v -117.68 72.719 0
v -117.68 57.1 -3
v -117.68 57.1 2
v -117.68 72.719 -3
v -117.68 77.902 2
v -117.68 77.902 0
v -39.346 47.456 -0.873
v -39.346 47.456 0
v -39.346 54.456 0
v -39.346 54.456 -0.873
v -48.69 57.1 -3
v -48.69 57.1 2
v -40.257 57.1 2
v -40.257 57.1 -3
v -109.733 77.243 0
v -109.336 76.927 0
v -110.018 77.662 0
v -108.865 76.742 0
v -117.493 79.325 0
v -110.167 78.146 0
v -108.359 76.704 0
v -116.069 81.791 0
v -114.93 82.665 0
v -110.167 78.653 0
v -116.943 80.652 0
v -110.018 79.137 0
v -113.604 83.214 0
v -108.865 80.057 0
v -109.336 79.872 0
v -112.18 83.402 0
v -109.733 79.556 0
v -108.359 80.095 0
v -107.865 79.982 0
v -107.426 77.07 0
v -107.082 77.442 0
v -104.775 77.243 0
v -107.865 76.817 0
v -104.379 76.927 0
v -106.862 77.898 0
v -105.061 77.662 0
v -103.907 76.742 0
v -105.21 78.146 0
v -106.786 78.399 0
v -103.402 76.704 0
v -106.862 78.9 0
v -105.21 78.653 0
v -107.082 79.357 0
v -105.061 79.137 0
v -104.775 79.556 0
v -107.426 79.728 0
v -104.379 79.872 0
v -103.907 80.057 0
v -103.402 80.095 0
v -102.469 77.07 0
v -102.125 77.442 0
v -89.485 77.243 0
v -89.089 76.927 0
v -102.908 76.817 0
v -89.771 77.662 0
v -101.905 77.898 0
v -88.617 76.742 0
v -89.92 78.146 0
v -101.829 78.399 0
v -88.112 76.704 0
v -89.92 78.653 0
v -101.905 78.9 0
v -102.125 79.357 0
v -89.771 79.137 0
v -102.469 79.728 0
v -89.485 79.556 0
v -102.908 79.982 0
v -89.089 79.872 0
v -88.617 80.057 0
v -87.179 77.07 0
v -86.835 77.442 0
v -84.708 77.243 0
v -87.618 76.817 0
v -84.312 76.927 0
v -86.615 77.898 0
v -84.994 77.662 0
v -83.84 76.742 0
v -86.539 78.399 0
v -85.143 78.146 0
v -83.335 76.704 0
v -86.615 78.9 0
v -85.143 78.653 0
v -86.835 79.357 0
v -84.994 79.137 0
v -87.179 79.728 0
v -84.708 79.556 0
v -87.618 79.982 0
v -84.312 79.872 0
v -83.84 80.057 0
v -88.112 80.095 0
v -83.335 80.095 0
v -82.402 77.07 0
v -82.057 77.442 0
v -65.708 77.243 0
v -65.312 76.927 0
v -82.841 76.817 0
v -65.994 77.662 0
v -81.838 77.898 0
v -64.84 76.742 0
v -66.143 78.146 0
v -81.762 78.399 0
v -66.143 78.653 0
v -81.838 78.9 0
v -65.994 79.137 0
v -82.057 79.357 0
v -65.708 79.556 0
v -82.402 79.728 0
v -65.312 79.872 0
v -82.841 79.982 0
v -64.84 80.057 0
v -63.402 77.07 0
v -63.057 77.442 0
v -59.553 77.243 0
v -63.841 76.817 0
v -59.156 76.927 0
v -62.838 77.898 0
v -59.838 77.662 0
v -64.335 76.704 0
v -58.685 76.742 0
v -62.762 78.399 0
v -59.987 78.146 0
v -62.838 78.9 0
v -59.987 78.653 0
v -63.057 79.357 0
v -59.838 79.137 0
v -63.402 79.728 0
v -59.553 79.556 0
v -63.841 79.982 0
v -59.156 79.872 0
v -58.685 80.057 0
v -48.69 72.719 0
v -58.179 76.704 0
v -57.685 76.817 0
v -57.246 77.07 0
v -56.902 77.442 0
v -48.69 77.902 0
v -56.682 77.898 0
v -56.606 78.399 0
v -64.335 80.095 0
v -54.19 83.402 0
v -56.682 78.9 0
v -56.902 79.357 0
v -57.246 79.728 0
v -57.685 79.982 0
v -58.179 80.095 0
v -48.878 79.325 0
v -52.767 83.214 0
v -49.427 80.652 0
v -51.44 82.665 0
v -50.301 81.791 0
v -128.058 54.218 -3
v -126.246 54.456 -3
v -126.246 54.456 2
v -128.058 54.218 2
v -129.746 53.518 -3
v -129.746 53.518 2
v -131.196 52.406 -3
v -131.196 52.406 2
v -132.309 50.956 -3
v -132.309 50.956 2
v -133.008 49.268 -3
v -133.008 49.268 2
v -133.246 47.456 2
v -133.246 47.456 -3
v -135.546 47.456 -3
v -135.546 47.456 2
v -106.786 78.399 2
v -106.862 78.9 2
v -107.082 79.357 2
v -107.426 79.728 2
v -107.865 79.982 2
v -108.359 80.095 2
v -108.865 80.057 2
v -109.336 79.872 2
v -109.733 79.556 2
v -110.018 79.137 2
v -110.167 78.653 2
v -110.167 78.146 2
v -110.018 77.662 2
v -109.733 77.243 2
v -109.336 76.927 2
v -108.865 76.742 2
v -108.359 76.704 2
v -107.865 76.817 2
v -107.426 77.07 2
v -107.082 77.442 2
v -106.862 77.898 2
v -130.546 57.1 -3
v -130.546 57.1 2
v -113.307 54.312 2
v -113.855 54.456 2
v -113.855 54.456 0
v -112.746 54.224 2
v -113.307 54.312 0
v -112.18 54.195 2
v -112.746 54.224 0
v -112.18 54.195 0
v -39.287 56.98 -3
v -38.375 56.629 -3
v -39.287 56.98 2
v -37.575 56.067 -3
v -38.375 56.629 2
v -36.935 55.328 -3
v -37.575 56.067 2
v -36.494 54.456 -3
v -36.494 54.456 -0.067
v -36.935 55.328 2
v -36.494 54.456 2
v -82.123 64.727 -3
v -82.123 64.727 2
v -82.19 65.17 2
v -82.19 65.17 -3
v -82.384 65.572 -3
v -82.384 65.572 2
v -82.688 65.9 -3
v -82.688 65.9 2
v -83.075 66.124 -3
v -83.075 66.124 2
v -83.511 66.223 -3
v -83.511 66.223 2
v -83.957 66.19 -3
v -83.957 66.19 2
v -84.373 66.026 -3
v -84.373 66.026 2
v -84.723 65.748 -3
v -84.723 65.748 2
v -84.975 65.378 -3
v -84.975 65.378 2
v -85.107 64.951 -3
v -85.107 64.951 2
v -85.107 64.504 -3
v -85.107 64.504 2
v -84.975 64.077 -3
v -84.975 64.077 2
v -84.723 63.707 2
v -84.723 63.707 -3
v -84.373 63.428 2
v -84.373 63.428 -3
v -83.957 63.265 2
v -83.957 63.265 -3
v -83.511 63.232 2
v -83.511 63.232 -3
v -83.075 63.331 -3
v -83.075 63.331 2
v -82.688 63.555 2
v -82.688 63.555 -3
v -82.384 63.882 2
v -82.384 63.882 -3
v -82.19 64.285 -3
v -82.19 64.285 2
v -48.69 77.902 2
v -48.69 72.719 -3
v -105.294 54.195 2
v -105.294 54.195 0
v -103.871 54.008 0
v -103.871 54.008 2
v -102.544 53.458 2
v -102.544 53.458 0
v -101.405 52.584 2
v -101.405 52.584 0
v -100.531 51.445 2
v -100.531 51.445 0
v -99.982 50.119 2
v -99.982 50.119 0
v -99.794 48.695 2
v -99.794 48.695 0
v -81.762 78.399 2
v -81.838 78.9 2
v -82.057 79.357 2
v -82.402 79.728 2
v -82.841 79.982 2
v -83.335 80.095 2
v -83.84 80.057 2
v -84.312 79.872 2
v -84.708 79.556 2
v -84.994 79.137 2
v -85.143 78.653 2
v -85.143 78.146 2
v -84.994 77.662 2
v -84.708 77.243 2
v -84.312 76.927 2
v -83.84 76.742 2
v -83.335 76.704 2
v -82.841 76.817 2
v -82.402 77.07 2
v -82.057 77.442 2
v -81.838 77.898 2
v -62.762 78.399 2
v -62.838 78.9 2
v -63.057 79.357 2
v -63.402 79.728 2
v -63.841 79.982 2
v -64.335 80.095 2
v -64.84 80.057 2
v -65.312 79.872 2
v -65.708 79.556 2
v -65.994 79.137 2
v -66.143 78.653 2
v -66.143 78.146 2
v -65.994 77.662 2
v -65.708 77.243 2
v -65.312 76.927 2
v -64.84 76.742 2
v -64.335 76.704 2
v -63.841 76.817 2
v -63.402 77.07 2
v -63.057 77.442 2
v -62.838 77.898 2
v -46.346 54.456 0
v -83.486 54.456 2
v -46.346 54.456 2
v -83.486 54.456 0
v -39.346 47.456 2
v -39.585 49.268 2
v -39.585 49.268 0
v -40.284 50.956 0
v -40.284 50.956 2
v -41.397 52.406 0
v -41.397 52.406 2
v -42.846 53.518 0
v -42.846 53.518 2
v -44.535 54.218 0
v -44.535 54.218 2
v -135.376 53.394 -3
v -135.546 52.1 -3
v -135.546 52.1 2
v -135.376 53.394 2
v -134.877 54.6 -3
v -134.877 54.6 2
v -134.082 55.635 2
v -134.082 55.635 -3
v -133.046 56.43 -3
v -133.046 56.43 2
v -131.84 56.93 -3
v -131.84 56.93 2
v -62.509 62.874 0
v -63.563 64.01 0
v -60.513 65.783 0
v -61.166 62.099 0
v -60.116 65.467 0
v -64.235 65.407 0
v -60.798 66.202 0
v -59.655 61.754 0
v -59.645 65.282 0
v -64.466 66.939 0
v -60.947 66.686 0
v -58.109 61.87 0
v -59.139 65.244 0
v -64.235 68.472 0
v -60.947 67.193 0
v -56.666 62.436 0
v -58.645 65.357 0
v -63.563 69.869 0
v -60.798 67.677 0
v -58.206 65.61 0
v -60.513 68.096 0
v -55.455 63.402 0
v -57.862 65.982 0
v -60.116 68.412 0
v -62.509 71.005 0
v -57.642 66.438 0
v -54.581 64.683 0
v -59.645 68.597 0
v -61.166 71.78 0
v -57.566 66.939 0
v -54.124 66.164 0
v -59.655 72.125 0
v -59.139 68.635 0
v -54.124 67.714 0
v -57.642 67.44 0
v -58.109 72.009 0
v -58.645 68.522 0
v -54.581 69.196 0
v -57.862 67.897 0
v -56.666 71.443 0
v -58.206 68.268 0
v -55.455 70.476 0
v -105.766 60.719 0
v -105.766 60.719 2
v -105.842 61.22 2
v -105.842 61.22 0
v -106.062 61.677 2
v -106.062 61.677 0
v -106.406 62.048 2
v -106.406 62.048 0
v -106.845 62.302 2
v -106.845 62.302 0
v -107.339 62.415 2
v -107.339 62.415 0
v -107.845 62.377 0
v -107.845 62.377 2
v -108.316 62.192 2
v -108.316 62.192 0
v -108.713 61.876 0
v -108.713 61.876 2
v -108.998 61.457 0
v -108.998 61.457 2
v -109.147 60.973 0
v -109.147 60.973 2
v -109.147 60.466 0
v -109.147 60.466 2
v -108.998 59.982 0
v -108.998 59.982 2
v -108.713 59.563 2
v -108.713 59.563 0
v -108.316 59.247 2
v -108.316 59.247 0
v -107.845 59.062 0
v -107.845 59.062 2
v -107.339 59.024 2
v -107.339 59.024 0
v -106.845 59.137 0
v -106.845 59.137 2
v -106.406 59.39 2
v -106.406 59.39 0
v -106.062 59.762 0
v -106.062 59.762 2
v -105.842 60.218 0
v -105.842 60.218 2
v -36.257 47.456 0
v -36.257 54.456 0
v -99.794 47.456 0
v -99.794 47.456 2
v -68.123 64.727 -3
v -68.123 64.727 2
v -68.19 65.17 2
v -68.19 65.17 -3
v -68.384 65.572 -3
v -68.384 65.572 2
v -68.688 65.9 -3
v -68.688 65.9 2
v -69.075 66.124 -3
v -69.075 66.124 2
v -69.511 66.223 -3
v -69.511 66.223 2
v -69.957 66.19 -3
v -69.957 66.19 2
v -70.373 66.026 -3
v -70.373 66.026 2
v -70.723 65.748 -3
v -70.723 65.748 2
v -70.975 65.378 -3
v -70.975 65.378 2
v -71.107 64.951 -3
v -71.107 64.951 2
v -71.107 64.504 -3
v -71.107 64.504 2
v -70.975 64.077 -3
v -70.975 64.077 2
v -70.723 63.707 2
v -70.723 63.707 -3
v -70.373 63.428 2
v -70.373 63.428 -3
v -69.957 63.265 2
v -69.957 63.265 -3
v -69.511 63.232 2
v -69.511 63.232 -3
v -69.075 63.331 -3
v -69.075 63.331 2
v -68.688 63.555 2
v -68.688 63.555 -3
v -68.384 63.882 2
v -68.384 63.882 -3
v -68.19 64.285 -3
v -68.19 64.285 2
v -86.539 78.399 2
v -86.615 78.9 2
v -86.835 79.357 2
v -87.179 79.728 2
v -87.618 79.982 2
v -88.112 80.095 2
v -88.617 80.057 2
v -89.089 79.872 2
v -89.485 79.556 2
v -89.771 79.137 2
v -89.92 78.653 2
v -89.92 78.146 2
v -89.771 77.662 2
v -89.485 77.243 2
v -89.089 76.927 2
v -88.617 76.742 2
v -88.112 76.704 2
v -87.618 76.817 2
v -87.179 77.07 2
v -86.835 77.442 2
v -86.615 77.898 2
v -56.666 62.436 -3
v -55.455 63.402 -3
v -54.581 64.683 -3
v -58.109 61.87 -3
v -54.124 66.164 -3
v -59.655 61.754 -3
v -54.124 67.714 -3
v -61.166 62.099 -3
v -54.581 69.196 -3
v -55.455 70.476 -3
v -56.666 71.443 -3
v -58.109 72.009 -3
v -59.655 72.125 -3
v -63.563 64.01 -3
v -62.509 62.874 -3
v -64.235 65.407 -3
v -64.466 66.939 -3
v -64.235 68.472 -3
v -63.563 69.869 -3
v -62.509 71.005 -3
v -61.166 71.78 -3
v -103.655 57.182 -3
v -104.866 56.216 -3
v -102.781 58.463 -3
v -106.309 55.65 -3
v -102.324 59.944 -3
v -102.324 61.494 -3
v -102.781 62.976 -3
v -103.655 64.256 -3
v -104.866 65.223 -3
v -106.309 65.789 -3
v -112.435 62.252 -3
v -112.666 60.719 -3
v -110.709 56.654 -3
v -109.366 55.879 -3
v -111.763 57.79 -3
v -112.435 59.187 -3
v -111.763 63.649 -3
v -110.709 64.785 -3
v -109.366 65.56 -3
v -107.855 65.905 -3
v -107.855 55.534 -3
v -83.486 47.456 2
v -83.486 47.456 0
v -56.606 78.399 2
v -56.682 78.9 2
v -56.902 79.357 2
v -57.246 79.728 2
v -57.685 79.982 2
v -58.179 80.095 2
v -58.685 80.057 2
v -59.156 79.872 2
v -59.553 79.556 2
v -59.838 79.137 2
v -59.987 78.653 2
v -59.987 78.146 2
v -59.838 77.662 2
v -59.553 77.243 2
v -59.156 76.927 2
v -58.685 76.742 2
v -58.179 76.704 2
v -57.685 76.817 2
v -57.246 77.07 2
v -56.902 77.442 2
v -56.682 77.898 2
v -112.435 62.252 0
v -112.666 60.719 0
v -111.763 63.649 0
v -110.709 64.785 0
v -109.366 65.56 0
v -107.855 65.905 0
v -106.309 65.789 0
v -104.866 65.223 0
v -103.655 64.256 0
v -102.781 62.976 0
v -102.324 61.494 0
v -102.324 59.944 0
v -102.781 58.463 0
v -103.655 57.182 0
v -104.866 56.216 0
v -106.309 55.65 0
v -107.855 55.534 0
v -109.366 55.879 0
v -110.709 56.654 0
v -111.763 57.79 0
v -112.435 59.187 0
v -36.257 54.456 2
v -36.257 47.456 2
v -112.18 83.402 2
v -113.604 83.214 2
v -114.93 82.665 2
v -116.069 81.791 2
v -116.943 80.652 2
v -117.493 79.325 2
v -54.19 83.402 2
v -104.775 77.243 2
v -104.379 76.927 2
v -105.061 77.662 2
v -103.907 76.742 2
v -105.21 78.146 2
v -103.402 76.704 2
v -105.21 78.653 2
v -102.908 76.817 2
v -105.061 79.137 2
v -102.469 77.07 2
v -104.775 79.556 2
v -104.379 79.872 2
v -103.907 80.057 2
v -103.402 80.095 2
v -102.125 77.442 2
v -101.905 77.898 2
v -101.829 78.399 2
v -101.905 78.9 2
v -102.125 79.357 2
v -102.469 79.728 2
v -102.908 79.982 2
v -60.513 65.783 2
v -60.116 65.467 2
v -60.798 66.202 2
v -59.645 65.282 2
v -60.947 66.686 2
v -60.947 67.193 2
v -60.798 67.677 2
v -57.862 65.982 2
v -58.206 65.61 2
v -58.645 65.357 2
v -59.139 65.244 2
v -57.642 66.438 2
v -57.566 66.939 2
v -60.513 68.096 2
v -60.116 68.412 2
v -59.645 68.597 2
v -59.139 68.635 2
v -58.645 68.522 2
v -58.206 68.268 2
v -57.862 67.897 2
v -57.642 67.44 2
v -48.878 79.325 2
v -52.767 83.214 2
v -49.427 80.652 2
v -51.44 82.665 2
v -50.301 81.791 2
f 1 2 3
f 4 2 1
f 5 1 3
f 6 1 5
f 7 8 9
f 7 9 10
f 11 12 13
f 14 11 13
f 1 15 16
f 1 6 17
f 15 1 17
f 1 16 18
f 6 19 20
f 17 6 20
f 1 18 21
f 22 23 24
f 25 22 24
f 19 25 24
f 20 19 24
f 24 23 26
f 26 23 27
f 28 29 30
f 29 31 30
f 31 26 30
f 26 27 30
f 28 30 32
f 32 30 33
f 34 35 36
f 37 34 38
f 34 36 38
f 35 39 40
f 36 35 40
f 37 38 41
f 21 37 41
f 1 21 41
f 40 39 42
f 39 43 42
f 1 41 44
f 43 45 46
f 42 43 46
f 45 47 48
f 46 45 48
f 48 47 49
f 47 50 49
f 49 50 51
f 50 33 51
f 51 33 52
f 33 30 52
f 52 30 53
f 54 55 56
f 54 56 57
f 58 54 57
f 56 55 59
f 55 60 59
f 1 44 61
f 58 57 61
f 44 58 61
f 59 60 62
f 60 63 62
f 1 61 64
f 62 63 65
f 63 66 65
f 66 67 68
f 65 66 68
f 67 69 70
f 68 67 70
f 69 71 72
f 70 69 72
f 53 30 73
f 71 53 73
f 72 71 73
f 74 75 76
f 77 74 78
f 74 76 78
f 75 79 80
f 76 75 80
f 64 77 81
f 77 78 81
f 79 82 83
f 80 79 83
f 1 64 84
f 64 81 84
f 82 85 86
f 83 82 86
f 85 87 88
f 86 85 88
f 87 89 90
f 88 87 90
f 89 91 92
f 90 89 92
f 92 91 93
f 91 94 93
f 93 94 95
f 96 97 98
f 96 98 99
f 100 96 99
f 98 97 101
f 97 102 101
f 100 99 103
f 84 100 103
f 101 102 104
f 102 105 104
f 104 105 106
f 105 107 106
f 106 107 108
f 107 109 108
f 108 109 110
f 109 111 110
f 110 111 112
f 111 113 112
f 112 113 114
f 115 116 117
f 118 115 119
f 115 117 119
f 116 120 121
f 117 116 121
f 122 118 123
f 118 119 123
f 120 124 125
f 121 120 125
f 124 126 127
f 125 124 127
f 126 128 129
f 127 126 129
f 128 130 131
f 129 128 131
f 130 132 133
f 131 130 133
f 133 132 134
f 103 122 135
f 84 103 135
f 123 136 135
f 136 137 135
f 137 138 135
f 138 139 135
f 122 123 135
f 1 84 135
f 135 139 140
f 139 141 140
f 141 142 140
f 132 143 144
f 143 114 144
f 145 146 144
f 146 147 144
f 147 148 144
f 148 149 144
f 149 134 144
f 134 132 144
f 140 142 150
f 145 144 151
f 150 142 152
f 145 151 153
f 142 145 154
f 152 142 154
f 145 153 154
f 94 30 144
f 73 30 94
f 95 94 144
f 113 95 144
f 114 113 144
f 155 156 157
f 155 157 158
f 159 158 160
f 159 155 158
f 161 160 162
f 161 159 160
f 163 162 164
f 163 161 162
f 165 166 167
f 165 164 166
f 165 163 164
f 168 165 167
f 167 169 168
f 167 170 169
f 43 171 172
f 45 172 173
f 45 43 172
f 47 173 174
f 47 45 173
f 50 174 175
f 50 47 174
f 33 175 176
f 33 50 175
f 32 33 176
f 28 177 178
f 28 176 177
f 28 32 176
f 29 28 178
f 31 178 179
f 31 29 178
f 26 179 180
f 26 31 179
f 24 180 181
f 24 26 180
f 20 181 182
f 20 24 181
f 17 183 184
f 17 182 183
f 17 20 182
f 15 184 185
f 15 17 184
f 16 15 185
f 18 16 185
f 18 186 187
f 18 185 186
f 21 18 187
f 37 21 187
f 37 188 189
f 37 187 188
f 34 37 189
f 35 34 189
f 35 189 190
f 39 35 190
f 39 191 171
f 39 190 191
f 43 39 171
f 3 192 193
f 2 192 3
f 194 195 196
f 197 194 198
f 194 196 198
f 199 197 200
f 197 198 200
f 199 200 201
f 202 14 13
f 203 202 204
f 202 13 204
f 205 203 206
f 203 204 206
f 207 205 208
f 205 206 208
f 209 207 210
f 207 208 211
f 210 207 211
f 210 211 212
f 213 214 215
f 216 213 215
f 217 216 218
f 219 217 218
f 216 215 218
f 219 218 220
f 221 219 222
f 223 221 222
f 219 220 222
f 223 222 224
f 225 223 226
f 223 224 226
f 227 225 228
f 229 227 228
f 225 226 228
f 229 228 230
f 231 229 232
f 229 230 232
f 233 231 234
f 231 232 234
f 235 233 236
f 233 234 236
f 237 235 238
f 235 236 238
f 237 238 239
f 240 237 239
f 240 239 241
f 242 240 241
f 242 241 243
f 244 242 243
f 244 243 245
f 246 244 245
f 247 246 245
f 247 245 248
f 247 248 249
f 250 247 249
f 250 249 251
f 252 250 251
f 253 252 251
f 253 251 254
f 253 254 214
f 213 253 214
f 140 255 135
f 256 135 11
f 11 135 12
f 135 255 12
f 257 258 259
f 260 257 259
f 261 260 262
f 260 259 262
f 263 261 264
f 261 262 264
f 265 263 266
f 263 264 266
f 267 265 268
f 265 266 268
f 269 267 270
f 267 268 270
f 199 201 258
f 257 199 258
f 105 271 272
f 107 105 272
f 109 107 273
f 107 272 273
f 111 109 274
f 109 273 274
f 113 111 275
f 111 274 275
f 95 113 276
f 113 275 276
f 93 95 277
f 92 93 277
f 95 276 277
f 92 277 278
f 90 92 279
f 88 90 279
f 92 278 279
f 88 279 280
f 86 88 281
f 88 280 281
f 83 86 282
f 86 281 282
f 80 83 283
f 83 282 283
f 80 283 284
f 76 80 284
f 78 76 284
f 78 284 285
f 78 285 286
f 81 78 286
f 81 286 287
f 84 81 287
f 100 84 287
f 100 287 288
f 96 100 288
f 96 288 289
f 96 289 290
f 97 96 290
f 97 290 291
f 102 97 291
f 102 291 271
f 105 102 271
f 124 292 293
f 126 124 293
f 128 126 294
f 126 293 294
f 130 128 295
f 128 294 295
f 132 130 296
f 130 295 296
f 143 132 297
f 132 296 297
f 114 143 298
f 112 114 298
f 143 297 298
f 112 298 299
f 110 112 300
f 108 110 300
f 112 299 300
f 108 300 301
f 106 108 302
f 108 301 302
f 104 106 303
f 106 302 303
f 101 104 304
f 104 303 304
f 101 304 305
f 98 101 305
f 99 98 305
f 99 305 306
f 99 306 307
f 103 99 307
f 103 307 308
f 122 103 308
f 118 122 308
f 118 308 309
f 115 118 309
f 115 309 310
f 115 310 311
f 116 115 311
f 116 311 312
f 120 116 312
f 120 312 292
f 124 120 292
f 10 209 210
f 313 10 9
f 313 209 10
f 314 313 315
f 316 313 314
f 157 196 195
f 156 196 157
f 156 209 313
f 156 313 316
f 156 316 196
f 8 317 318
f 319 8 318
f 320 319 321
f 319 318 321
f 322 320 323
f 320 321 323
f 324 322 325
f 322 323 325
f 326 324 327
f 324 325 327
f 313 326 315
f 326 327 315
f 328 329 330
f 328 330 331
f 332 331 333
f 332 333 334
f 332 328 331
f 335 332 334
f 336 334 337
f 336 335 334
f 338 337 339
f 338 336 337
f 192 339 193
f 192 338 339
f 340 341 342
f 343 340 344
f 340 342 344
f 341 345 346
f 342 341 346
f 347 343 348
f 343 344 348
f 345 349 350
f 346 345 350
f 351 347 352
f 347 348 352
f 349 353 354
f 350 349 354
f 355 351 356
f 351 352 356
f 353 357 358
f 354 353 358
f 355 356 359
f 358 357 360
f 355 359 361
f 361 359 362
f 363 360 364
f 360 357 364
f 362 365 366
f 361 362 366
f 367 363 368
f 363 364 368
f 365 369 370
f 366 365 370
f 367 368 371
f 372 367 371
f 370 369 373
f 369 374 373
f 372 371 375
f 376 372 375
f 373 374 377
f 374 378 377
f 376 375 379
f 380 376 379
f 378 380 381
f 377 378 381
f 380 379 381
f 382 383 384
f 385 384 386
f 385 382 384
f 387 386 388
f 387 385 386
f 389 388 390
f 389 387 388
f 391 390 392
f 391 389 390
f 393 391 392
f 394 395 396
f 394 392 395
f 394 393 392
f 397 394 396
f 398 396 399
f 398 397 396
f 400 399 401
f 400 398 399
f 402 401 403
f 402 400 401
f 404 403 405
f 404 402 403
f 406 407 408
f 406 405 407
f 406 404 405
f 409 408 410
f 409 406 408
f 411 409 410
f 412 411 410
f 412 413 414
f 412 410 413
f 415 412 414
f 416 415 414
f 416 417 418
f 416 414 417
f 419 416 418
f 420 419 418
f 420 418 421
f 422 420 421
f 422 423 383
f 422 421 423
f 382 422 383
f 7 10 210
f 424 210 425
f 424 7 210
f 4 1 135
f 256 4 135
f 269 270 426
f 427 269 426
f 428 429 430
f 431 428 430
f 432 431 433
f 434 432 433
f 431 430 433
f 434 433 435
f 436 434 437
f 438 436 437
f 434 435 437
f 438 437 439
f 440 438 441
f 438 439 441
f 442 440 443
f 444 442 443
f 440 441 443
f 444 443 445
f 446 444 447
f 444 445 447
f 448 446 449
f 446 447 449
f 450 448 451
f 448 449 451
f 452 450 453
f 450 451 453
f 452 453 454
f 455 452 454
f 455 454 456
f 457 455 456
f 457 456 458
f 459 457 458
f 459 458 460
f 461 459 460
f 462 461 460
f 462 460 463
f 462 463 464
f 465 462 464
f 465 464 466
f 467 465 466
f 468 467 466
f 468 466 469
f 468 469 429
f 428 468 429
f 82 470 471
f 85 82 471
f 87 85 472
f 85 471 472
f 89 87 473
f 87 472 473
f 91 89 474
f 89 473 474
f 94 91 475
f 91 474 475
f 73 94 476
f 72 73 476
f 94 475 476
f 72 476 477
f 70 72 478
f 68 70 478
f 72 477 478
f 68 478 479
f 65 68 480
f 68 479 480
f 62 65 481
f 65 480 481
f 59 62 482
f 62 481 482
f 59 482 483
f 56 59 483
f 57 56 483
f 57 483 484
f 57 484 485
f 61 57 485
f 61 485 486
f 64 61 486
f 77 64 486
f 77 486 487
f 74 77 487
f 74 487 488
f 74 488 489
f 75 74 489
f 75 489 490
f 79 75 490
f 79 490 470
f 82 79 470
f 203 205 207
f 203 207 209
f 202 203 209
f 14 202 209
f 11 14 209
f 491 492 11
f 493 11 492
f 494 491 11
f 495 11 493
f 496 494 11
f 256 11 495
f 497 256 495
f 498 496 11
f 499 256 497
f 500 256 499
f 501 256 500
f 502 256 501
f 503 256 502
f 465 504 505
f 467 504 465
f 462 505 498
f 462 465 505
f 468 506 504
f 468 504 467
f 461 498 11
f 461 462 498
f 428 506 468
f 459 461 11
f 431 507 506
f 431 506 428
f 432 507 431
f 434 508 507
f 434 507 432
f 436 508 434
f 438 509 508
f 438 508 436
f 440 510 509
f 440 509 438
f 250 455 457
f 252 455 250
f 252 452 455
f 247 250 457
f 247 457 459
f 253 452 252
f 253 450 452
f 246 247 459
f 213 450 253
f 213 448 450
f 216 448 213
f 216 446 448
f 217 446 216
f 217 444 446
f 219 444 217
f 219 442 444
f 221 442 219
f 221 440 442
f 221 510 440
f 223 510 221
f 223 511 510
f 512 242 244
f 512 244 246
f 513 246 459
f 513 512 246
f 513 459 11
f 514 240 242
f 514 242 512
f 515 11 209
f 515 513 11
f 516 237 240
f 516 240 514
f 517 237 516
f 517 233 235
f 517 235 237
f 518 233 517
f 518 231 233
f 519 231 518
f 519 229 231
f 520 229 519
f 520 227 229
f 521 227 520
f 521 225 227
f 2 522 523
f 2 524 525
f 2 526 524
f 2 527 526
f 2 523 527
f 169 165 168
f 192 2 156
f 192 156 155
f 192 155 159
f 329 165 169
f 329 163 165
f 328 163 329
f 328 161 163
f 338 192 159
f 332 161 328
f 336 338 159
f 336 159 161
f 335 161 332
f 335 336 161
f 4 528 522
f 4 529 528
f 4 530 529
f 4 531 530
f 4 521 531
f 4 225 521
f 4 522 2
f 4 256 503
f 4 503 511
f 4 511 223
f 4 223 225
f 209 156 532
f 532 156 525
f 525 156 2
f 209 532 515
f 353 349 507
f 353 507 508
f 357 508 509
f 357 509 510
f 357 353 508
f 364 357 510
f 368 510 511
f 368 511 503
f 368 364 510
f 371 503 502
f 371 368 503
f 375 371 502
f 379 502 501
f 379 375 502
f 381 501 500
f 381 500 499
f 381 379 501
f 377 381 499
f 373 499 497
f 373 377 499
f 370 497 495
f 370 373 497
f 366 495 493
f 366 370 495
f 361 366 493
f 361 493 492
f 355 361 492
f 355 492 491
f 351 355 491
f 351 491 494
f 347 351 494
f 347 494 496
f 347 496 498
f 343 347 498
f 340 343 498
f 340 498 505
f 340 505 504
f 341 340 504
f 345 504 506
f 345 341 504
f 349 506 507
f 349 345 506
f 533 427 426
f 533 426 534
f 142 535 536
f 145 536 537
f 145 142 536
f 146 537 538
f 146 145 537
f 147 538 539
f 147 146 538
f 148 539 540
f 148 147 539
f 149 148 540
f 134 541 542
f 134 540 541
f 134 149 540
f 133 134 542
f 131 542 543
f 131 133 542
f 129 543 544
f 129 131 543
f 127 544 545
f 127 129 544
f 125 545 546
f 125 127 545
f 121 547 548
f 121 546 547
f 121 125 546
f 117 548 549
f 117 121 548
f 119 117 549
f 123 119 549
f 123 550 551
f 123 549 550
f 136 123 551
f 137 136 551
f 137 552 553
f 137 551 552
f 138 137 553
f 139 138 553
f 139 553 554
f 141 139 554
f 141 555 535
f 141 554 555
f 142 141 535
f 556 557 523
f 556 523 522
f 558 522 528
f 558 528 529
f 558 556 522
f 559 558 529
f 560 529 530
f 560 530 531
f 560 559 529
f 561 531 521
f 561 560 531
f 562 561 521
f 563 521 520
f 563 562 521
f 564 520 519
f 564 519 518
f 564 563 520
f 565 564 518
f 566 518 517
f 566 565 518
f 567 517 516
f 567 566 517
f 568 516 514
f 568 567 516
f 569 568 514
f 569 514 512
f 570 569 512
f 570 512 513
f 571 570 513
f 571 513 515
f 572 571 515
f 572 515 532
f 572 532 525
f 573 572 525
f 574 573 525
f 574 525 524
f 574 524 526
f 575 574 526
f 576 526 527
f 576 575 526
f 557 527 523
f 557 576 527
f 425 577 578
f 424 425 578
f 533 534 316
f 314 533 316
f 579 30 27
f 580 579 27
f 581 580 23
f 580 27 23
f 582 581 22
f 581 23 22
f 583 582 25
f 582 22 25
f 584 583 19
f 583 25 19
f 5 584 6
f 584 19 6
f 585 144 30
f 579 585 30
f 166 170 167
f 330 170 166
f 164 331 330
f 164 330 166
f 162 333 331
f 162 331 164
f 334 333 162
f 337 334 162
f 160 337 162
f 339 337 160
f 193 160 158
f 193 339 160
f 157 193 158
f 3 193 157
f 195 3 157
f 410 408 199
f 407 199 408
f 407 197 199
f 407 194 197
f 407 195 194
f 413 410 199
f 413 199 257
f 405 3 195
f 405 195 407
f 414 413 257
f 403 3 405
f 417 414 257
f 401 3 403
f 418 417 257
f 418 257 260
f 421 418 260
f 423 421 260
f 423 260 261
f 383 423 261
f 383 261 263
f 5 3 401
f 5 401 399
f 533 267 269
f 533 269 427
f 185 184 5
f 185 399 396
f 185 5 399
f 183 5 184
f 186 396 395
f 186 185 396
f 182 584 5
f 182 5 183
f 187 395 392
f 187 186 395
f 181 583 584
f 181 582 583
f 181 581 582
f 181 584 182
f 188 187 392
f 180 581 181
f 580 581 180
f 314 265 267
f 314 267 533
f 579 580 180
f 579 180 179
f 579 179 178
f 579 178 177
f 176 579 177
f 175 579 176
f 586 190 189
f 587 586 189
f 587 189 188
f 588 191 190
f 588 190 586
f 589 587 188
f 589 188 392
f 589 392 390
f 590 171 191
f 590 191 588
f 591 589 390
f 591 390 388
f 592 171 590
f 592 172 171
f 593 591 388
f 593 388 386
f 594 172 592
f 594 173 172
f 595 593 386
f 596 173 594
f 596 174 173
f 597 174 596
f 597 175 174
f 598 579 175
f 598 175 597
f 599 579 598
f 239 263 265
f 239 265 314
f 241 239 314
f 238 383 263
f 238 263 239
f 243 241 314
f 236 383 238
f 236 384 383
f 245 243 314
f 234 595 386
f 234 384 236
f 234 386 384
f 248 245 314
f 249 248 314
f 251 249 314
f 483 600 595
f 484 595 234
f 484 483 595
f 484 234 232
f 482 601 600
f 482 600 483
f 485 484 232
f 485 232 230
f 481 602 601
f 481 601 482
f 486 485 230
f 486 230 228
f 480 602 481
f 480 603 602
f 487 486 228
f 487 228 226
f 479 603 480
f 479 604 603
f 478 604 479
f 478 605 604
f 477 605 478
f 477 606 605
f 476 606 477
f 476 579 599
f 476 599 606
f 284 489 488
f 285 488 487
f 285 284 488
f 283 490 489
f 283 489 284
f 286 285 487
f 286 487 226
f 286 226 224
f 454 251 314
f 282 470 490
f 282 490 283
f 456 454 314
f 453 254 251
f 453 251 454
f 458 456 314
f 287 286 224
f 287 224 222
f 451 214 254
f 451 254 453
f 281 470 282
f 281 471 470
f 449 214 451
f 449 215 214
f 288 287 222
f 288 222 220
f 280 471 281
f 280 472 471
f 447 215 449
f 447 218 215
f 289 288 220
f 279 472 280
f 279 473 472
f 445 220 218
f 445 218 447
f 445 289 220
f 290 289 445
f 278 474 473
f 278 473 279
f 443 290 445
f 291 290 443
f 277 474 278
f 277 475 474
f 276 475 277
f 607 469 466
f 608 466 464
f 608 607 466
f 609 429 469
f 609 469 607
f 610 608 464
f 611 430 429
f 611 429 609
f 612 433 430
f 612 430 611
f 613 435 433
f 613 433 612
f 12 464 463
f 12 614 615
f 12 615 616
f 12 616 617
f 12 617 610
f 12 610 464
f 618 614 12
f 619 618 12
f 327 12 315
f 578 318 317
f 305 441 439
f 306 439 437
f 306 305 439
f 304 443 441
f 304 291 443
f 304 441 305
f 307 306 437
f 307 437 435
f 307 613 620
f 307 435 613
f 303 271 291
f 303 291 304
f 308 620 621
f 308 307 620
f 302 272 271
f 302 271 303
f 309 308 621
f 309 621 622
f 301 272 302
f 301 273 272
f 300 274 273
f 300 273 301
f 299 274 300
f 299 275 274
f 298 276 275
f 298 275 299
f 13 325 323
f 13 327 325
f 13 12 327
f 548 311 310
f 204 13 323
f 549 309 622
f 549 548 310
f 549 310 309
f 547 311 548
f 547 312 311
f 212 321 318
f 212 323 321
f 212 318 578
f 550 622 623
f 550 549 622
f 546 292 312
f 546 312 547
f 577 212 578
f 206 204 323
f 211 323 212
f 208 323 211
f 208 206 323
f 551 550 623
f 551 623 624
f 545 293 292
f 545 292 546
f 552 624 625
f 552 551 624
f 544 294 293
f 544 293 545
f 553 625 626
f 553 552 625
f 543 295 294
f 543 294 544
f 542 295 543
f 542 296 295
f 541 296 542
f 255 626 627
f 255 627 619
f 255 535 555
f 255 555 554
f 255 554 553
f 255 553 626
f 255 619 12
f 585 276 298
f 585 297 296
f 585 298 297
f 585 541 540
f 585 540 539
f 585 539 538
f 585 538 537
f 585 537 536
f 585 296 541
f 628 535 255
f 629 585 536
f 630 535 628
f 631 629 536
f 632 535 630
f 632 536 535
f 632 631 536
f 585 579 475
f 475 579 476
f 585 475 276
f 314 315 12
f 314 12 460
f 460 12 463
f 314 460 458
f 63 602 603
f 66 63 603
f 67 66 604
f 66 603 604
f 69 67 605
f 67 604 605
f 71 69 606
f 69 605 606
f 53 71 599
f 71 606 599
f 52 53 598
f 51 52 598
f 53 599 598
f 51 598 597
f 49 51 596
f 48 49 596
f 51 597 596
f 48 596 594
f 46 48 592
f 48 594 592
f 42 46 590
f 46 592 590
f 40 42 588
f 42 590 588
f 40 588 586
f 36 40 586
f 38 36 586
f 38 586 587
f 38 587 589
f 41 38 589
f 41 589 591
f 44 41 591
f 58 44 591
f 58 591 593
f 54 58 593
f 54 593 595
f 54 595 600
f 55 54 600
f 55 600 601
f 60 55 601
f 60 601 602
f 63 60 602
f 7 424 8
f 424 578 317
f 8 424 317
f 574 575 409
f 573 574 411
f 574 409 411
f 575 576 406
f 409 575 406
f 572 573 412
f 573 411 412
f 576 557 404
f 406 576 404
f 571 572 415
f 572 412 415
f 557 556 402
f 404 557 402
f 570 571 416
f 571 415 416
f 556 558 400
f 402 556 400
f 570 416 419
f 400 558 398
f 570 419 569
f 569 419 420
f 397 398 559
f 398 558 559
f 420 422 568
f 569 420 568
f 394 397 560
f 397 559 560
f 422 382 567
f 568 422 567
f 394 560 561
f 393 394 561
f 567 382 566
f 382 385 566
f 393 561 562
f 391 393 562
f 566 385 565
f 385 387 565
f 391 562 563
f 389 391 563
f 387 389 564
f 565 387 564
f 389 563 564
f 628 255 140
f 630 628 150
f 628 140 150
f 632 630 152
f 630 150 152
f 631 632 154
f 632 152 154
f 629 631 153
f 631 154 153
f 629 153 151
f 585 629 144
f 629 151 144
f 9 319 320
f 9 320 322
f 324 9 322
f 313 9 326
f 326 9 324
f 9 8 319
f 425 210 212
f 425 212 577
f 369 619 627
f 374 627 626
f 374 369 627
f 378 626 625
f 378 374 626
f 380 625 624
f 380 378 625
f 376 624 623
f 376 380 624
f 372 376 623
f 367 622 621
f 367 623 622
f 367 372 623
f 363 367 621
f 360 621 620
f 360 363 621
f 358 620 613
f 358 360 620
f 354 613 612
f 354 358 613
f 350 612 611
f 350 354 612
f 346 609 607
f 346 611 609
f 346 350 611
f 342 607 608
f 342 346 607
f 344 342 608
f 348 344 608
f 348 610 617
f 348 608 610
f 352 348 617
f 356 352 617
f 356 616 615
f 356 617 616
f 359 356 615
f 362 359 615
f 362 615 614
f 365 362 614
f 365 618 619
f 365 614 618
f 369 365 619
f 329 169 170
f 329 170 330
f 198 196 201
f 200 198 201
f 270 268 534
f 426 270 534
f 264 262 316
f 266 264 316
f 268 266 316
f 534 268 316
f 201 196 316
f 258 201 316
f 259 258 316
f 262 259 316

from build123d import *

# Parameters (mm, degrees)
ESQUISSE1_R             = 1.7
BOSS_EXTRU_1_DEPTH      = 3
BOSS_EXTRU_2_DEPTH      = 3
BOSS_EXTRU_2_DEPTH_BACK = 3
ESQUISSE2_R             = 5.2
ESQUISSE5_W             = 129.390100882
ESQUISSE5_H             = 120.053414285
ENL_V_MAT_EXTRU_2_DEPTH = 1
ESQUISSE6_R             = 1.5
ENL_V_MAT_EXTRU_3_DEPTH = 8
ESQUISSE7_W             = 14.610679854
ESQUISSE7_H             = 62.75
ENL_V_MAT_EXTRU_4_DEPTH = 8
BOSS_EXTRU_3_DEPTH      = 7
BOSS_EXTRU_4_DEPTH      = 7
ESQUISSE11_W            = 149.051338644
ESQUISSE11_H            = 13.366564364
ENL_V_MAT_EXTRU_5_DEPTH = 80
ESQUISSE13_R            = 1.7
ENL_V_MAT_EXTRU_6_DEPTH = 15


with BuildPart() as part:
    # Esquisse1 → Boss.-Extru.1 (new body)
    with BuildSketch(Plane.XY):
        with BuildLine():
            Line((-117.680084405, 66.939310237), (-117.680084405, 59.695120061))
            ThreePointArc((-117.680084405, 59.695120061), (-116.069171702, 55.806032765), (-112.180084405, 54.195120061))
            Line((-112.180084405, 54.195120061), (-105.294175096, 54.195120061))
            ThreePointArc((-105.294175096, 54.195120061), (-101.4050878, 52.584207358), (-99.794175096, 48.695120061))
            Line((-99.794175096, 48.695120061), (-99.794175096, 35.930823665))
            ThreePointArc((-99.794175096, 35.930823665), (-101.4050878, 32.041736368), (-105.294175096, 30.430823665))
            Line((-105.294175096, 30.430823665), (-112.180084405, 30.430823665))
            ThreePointArc((-112.180084405, 30.430823665), (-116.069171702, 28.819910961), (-117.680084405, 24.930823665))
            Line((-117.680084405, 24.930823665), (-117.680084405, 23.910007682))
            ThreePointArc((-117.680084405, 23.910007682), (-116.069171702, 20.020920385), (-112.180084405, 18.410007682))
            Line((-112.180084405, 18.410007682), (-105.294175096, 18.410007682))
            ThreePointArc((-105.294175096, 18.410007682), (-101.4050878, 16.799094979), (-99.794175096, 12.910007682))
            Line((-99.794175096, 12.910007682), (-99.794175096, 1.692208933))
            ThreePointArc((-99.794175096, 1.692208933), (-101.4050878, -2.196878364), (-105.294175096, -3.807791067))
            Line((-105.294175096, -3.807791067), (-113.390601299, -3.807791067))
            ThreePointArc((-113.390601299, -3.807791067), (-117.279688595, -5.418703771), (-118.890601299, -9.307791067))
            Line((-118.890601299, -9.307791067), (-118.890601299, -18.42196685))
            ThreePointArc((-118.890601299, -18.42196685), (-117.279688595, -22.311054147), (-113.390601299, -23.92196685))
            Line((-113.390601299, -23.92196685), (-52.866544484, -23.92196685))
            ThreePointArc((-52.866544484, -23.92196685), (-48.977457187, -22.311054147), (-47.366544484, -18.42196685))
            Line((-47.366544484, -18.42196685), (-47.366544484, -9.307791067))
            ThreePointArc((-47.366544484, -9.307791067), (-48.977457187, -5.418703771), (-52.866544484, -3.807791067))
            Line((-52.866544484, -3.807791067), (-77.986378892, -3.807791067))
            ThreePointArc((-77.986378892, -3.807791067), (-81.875466189, -2.196878364), (-83.486378892, 1.692208933))
            Line((-83.486378892, 1.692208933), (-83.486378892, 12.910007682))
            ThreePointArc((-83.486378892, 12.910007682), (-81.875466189, 16.799094979), (-77.986378892, 18.410007682))
            Line((-77.986378892, 18.410007682), (-69.856378892, 18.410007682))
            ThreePointArc((-69.856378892, 18.410007682), (-65.967291596, 20.020920385), (-64.356378892, 23.910007682))
            Line((-64.356378892, 23.910007682), (-64.356378892, 24.930823665))
            ThreePointArc((-64.356378892, 24.930823665), (-65.967291596, 28.819910961), (-69.856378892, 30.430823665))
            Line((-69.856378892, 30.430823665), (-77.986378892, 30.430823665))
            ThreePointArc((-77.986378892, 30.430823665), (-81.875466189, 32.041736368), (-83.486378892, 35.930823665))
            Line((-83.486378892, 35.930823665), (-83.486378892, 55.219310237))
            ThreePointArc((-83.486378892, 55.219310237), (-81.875466189, 59.108397534), (-77.986378892, 60.719310237))
            Line((-77.986378892, 60.719310237), (-54.190366806, 60.719310237))
            ThreePointArc((-54.190366806, 60.719310237), (-50.30127951, 62.330222941), (-48.690366806, 66.219310237))
            Line((-48.690366806, 66.219310237), (-48.690366806, 67.219310237))
            Line((-48.690366806, 67.219310237), (-48.690366806, 77.901748252))
            ThreePointArc((-48.690366806, 77.901748252), (-50.30127951, 81.790835548), (-54.190366806, 83.401748252))
            Line((-54.190366806, 83.401748252), (-112.180084405, 83.401748252))
            ThreePointArc((-112.180084405, 83.401748252), (-116.069171702, 81.790835548), (-117.680084405, 77.901748252))
            Line((-117.680084405, 77.901748252), (-117.680084405, 67.219310237))
            Line((-117.680084405, 67.219310237), (-117.680084405, 66.939310237))
        make_face()
        with Locations((-59.266378892, -15.663707737)):
            Circle(ESQUISSE1_R, mode=Mode.SUBTRACT)
        with Locations((-59.266378892, 66.939310237)):
            Circle(ESQUISSE1_R, mode=Mode.SUBTRACT)
        with Locations((-91.856378892, 36.719310237)):
            Circle(ESQUISSE1_R, mode=Mode.SUBTRACT)
        with Locations((-107.466378892, -14.520689763)):
            Circle(ESQUISSE1_R, mode=Mode.SUBTRACT)
        with Locations((-107.466378892, 60.719310237)):
            Circle(ESQUISSE1_R, mode=Mode.SUBTRACT)
        with Locations((-58.306378892, 78.399310237)):
            Circle(ESQUISSE1_R, mode=Mode.SUBTRACT)
        with Locations((-108.486378892, 78.399310237)):
            Circle(ESQUISSE1_R, mode=Mode.SUBTRACT)
        with BuildLine():
            Line((-111.390601299, 21.460065469), (-70.086378892, 21.460065469))
            ThreePointArc((-70.086378892, 21.460065469), (-68.67216533, 22.045851906), (-68.086378892, 23.460065469))
            Line((-68.086378892, 23.460065469), (-68.086378892, 24.842520386))
            ThreePointArc((-68.086378892, 24.842520386), (-68.67216533, 26.256733949), (-70.086378892, 26.842520386))
            Line((-70.086378892, 26.842520386), (-111.390601299, 26.842520386))
            ThreePointArc((-111.390601299, 26.842520386), (-112.804814861, 26.256733949), (-113.390601299, 24.842520386))
            Line((-113.390601299, 24.842520386), (-113.390601299, 23.460065469))
            ThreePointArc((-113.390601299, 23.460065469), (-112.804814861, 22.045851906), (-111.390601299, 21.460065469))
        make_face(mode=Mode.SUBTRACT)
    extrude(amount=BOSS_EXTRU_1_DEPTH)

    # Esquisse2 → Boss.-Extru.2 (add, two sides: drawn at the far end of the back side and taken through both)
    with BuildSketch(Plane(origin=(0, 0, 0), x_dir=(-1, 0, 0), z_dir=(0, 0, -1)).offset(-BOSS_EXTRU_2_DEPTH_BACK)):
        with BuildLine():
            Line((118.890601299, -9.969506719), (130.584615963, -9.880075131))
            ThreePointArc((130.584615963, -9.880075131), (134.095405897, -8.402210456), (135.546378892, -4.880221341))
            Line((135.546378892, -4.880221341), (135.546378892, 5.415623015))
            ThreePointArc((135.546378892, 5.415623015), (136.425058549, 7.536943358), (138.546378892, 8.415623015))
            Line((138.546378892, 8.415623015), (145.752654566, 8.415623015))
            ThreePointArc((145.752654566, 8.415623015), (147.87397491, 9.294302671), (148.752654566, 11.415623015))
            Line((148.752654566, 11.415623015), (148.752654566, 38.179170847))
            ThreePointArc((148.752654566, 38.179170847), (147.87397491, 40.300491191), (145.752654566, 41.179170847))
            Line((145.752654566, 41.179170847), (138.546378892, 41.179170847))
            ThreePointArc((138.546378892, 41.179170847), (136.425058549, 42.057850504), (135.546378892, 44.179170847))
            Line((135.546378892, 44.179170847), (135.546378892, 52.099902349))
            ThreePointArc((135.546378892, 52.099902349), (134.081912798, 55.635436255), (130.546378892, 57.099902349))
            Line((130.546378892, 57.099902349), (117.680084405, 57.099902349))
            Line((117.680084405, 57.099902349), (117.680084405, 72.719310237))
            Line((117.680084405, 72.719310237), (48.690366806, 72.719310237))
            Line((48.690366806, 72.719310237), (48.690366806, 60.719310237))
            Line((48.690366806, 60.719310237), (48.690366806, 57.099902349))
            Line((48.690366806, 57.099902349), (40.256901013, 57.099902349))
            ThreePointArc((40.256901013, 57.099902349), (37.428473888, 55.928329474), (36.256901013, 53.099902349))
            Line((36.256901013, 53.099902349), (36.256901013, 47.456292263))
            Line((36.256901013, 47.456292263), (39.346378892, 47.456292263))
            ThreePointArc((39.346378892, 47.456292263), (41.396631424, 52.406039732), (46.346378892, 54.456292263))
            Line((46.346378892, 54.456292263), (126.246378892, 54.456292263))
            ThreePointArc((126.246378892, 54.456292263), (131.196126361, 52.406039732), (133.246378892, 47.456292263))
            Line((133.246378892, 47.456292263), (133.246378892, 40.977229779))
            ThreePointArc((133.246378892, 40.977229779), (134.125058549, 38.855909436), (136.246378892, 37.977229779))
            Line((136.246378892, 37.977229779), (142.162261637, 37.977229779))
            ThreePointArc((142.162261637, 37.977229779), (144.28358198, 37.098550123), (145.162261637, 34.977229779))
            Line((145.162261637, 34.977229779), (145.162261637, 14.363062522))
            ThreePointArc((145.162261637, 14.363062522), (144.28358198, 12.241742179), (142.162261637, 11.363062522))
            Line((142.162261637, 11.363062522), (136.246378892, 11.363062522))
            ThreePointArc((136.246378892, 11.363062522), (134.125058549, 10.484382866), (133.246378892, 8.363062522))
            Line((133.246378892, 8.363062522), (133.246378892, -1.293707737))
            ThreePointArc((133.246378892, -1.293707737), (131.196126361, -6.243455205), (126.246378892, -8.293707737))
            Line((126.246378892, -8.293707737), (46.346378892, -8.293707737))
            ThreePointArc((46.346378892, -8.293707737), (41.396631424, -6.243455205), (39.346378892, -1.293707737))
            Line((39.346378892, -1.293707737), (36.248203357, -1.293707737))
            Line((36.248203357, -1.293707737), (36.248203357, -6.64542392))
            ThreePointArc((36.248203357, -6.64542392), (37.432020164, -9.486042202), (40.282759469, -10.645274652))
            Line((40.282759469, -10.645274652), (47.366544484, -10.58407535))
            Line((47.366544484, -10.58407535), (47.366544484, -23.92196685))
            Line((47.366544484, -23.92196685), (118.890601299, -23.92196685))
            Line((118.890601299, -23.92196685), (118.890601299, -9.969506719))
        make_face()
        with Locations((59.266378892, -15.663707737)):
            Circle(ESQUISSE2_R, mode=Mode.SUBTRACT)
        with Locations((107.466378892, -14.520689763)):
            Circle(ESQUISSE2_R, mode=Mode.SUBTRACT)
        with Locations((107.466378892, 60.719310237)):
            Circle(ESQUISSE2_R, mode=Mode.SUBTRACT)
        with Locations((59.266378892, 66.939310237)):
            Circle(ESQUISSE2_R, mode=Mode.SUBTRACT)
    extrude(amount=BOSS_EXTRU_2_DEPTH + BOSS_EXTRU_2_DEPTH_BACK)

    # Esquisse5 → Enlèv. mat.-Extru.2 (cut)
    with BuildSketch(Plane.XY.offset(3)):
        with Locations((-91.695706627, 29.828971757)):
            Rectangle(ESQUISSE5_W, ESQUISSE5_H)
    extrude(amount=-ENL_V_MAT_EXTRU_2_DEPTH, mode=Mode.SUBTRACT)

    # Esquisse6 → Enlèv. mat.-Extru.3 (cut)
    with BuildSketch(Plane.XY.offset(2)):
        with Locations((-69.623492164, 64.727424081)):
            Circle(ESQUISSE6_R)
        with Locations((-83.623492164, 64.727424081)):
            Circle(ESQUISSE6_R)
    extrude(amount=-ENL_V_MAT_EXTRU_3_DEPTH, mode=Mode.SUBTRACT)

    # Esquisse7 → Enlèv. mat.-Extru.4 (cut)
    with BuildSketch(Plane(origin=(0, 0, 0), x_dir=(-1, 0, 0), z_dir=(0, 0, -1))):
        with Locations((42.567758063, 23.081292263)):
            Rectangle(ESQUISSE7_W, ESQUISSE7_H)
    extrude(amount=ENL_V_MAT_EXTRU_4_DEPTH, mode=Mode.SUBTRACT)

    # Esquisse9 → Boss.-Extru.3 (add)
    with BuildSketch(Plane(origin=(0, -1.293707737, 0), x_dir=(1, 0, 0), z_dir=(0, 1, 0))):
        Polygon((-39.346378892, -2), (-39.346378892, 0.886005049), (-36.248203357, 0), (-36.248203357, -2), align=None)
    extrude(amount=-BOSS_EXTRU_3_DEPTH)

    # Esquisse10 → Boss.-Extru.4 (add)
    with BuildSketch(Plane.XZ.offset(-47.456292263)):
        Polygon((-39.346378892, 2), (-39.346378892, -0.873043126), (-36.256901013, 0), (-36.256901013, 2), align=None)
    extrude(amount=-BOSS_EXTRU_4_DEPTH)

    # Esquisse11 → Enlèv. mat.-Extru.5 (cut)
    with BuildSketch(Plane.XZ.offset(-47.456292263)):
        with Locations((-92.889015797, -0.494206667)):
            Rectangle(ESQUISSE11_W, ESQUISSE11_H)
    extrude(amount=ENL_V_MAT_EXTRU_5_DEPTH, mode=Mode.SUBTRACT)

    # Esquisse13 → Enlèv. mat.-Extru.6 (cut)
    with BuildSketch(Plane.XY.offset(2)):
        with Locations((-103.52911982, 78.399310237)):
            Circle(ESQUISSE13_R)
        with Locations((-88.23911982, 78.399310237)):
            Circle(ESQUISSE13_R)
        with Locations((-83.462080633, 78.399310237)):
            Circle(ESQUISSE13_R)
        with Locations((-64.462080633, 78.399310237)):
            Circle(ESQUISSE13_R)
    extrude(amount=-ENL_V_MAT_EXTRU_6_DEPTH, mode=Mode.SUBTRACT)


solid = part.part
